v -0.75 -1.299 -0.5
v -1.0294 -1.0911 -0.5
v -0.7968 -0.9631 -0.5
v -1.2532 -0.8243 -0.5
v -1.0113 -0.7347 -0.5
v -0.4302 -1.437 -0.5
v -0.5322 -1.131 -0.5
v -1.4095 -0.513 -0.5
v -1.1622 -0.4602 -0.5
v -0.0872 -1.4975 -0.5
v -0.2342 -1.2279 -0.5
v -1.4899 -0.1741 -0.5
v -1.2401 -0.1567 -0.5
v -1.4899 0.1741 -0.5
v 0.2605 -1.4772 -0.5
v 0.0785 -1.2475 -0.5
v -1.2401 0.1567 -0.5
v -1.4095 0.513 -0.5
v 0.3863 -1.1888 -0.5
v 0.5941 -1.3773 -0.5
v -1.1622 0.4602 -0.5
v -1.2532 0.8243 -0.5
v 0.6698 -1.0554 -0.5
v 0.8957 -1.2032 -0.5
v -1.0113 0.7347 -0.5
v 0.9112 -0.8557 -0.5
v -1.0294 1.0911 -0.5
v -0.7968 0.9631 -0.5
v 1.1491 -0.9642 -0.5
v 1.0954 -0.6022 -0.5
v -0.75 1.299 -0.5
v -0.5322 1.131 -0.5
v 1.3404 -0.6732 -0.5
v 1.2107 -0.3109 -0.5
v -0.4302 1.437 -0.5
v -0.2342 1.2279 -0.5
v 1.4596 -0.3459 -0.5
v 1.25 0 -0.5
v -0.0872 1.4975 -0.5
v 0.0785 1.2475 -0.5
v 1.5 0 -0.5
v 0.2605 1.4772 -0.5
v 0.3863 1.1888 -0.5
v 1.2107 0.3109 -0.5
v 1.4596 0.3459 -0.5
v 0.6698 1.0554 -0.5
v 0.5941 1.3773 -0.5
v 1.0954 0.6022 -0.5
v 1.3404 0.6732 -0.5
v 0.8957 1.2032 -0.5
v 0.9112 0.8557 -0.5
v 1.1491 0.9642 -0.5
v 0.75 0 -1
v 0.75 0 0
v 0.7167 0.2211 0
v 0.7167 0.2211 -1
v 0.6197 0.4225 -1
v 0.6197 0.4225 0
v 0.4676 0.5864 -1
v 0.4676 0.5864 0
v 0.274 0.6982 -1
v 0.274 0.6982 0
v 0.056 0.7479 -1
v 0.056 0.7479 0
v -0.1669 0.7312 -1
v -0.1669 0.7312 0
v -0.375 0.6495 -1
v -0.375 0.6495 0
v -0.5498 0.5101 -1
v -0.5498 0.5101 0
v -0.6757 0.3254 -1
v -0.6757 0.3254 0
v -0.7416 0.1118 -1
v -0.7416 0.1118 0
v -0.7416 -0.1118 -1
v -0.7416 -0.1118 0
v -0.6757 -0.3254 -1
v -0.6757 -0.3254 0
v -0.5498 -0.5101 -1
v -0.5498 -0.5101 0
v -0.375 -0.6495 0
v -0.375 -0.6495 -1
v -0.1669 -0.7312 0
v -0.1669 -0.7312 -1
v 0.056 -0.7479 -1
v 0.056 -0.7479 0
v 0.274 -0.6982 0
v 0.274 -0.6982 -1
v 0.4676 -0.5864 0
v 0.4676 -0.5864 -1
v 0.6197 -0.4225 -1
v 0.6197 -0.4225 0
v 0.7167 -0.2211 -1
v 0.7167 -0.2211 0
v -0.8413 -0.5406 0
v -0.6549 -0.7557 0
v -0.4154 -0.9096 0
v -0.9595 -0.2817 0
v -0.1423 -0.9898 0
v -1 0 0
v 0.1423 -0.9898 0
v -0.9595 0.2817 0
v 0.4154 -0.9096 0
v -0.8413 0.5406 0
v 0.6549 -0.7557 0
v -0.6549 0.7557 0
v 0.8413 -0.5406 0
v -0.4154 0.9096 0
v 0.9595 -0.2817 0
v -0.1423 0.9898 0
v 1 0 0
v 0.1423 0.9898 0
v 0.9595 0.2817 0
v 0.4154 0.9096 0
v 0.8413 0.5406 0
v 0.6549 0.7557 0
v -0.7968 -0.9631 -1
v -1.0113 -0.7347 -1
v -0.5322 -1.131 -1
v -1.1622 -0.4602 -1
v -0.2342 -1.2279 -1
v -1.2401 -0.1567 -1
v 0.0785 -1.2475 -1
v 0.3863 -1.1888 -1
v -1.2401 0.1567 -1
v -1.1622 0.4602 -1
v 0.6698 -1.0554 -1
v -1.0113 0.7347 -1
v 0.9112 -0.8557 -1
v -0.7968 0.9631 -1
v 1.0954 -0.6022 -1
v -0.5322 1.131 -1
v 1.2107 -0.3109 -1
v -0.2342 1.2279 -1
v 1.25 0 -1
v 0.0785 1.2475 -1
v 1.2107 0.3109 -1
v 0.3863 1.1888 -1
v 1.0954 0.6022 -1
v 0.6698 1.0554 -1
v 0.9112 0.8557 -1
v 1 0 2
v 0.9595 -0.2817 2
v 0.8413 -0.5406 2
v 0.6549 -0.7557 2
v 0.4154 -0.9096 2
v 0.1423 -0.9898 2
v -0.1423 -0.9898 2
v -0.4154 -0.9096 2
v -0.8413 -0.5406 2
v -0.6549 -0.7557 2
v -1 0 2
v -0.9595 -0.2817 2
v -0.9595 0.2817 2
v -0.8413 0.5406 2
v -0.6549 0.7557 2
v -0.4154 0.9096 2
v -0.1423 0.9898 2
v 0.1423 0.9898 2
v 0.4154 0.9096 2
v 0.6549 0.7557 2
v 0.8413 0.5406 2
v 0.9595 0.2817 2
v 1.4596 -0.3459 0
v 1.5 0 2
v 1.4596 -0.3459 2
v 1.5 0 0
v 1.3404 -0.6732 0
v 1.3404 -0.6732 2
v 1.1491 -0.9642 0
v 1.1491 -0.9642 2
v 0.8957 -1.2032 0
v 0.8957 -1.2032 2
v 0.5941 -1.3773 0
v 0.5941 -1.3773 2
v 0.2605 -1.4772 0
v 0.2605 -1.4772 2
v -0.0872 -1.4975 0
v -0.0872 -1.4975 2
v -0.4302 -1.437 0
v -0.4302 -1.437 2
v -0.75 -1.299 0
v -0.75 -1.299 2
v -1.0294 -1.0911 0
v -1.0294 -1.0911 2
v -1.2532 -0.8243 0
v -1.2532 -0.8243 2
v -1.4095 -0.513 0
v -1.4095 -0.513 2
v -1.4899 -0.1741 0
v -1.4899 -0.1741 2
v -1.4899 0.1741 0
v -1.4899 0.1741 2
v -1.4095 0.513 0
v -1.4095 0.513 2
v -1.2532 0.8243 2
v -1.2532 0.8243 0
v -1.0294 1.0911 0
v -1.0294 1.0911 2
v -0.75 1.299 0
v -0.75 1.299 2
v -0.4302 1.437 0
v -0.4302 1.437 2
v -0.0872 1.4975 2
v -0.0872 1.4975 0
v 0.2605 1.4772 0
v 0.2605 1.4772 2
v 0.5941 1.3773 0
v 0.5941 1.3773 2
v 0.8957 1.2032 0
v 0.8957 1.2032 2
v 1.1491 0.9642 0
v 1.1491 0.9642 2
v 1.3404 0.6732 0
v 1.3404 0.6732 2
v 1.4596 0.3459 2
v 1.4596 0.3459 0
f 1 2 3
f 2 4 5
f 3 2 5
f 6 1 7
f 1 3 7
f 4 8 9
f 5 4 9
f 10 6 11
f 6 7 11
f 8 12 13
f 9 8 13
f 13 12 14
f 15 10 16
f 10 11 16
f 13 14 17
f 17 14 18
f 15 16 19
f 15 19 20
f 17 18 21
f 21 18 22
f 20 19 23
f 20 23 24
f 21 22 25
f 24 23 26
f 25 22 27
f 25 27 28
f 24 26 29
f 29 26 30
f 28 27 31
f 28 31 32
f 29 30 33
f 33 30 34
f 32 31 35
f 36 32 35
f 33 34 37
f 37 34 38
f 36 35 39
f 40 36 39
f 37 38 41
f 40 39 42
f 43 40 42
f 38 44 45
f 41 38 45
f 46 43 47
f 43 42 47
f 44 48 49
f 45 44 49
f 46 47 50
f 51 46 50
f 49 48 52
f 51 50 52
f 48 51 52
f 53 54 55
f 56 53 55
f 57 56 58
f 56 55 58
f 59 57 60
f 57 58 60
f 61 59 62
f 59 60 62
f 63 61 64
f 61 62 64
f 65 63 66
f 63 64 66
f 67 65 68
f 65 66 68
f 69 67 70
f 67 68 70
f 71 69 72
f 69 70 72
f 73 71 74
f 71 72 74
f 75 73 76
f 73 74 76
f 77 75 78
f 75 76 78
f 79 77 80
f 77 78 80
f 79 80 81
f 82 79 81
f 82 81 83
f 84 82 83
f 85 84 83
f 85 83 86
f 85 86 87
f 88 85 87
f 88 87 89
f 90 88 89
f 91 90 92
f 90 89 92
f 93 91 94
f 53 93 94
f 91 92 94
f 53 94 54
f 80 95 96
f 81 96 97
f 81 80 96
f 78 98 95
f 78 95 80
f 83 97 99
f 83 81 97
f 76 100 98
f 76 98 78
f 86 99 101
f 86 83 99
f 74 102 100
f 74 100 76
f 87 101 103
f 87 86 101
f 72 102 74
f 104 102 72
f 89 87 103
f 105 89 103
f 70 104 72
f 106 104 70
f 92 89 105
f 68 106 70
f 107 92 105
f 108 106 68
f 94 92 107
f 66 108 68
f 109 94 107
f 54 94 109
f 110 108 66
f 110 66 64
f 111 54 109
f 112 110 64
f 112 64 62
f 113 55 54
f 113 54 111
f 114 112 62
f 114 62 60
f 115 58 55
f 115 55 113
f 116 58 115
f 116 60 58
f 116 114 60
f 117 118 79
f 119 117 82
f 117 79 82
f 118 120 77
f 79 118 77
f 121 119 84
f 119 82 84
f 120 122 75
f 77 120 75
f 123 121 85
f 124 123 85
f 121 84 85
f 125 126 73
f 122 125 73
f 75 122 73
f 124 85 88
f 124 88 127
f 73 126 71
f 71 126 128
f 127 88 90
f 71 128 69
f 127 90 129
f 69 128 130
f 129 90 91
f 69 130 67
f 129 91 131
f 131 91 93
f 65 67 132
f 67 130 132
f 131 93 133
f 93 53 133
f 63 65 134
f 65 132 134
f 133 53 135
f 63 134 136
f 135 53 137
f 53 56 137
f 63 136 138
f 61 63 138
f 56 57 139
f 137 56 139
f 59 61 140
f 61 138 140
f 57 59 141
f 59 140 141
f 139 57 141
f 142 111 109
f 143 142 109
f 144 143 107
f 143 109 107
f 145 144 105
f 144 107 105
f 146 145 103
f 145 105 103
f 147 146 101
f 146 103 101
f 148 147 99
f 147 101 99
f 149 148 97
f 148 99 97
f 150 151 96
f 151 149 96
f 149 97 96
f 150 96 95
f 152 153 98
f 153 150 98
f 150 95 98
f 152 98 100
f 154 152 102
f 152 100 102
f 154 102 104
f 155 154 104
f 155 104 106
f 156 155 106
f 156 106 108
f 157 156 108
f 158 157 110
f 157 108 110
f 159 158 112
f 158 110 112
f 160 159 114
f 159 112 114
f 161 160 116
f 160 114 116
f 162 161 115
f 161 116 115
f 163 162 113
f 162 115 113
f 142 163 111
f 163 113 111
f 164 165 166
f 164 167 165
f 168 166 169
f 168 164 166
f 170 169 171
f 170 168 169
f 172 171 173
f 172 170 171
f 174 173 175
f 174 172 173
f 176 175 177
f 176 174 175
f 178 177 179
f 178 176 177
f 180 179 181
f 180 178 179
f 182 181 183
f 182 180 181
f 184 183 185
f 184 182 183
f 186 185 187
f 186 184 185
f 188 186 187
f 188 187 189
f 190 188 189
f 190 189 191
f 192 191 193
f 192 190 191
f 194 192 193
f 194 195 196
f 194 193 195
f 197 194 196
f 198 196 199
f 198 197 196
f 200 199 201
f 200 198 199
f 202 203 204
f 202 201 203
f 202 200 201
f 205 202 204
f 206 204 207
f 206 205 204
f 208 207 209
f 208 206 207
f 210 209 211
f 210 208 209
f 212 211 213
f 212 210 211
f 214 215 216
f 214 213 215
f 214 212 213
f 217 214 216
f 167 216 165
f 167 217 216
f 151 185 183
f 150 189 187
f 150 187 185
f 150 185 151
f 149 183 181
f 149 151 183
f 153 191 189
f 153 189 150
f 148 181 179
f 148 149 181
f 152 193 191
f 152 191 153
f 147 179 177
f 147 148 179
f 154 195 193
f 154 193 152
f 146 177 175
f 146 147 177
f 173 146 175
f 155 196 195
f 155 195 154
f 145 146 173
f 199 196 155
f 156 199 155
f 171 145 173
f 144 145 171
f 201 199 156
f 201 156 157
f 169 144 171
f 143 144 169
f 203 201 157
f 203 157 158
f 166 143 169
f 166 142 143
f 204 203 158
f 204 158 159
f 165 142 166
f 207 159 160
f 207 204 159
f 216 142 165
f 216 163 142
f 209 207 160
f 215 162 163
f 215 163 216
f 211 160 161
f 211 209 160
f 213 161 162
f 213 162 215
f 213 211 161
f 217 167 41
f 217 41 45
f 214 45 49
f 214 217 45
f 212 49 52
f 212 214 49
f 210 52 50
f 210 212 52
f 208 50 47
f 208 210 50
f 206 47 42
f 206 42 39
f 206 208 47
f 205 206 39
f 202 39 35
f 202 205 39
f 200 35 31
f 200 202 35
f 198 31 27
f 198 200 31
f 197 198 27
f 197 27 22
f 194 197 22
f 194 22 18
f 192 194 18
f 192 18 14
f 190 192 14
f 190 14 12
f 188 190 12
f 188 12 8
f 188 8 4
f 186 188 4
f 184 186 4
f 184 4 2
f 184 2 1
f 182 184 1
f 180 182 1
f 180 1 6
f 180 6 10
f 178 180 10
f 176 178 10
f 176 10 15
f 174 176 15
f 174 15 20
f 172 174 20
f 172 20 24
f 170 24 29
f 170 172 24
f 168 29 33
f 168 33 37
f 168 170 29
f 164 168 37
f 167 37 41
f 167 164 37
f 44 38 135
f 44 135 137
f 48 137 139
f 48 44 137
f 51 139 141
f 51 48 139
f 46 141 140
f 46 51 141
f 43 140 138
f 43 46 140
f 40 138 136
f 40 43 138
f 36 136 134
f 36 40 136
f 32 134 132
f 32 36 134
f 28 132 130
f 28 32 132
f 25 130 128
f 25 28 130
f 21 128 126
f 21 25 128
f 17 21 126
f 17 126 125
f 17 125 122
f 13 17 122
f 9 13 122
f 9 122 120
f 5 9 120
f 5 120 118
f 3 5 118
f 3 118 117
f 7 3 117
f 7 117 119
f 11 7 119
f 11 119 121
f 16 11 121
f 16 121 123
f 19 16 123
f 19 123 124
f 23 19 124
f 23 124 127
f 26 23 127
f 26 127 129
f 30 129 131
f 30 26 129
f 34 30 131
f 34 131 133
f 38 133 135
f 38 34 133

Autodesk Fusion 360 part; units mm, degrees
sketch "スケッチ1" plane through (0, 0, 0) normal (0, 0, 1) x (1, 0, 0)
  circle A0 centre (0, 0) radius 0.75
  circle A1 centre (0, 0) radius 1
  circle A2 centre (0, 0) radius 1.5
  circle A3 centre (0, 0) radius 1.25
  dimension "d1" = 1.5
  dimension "d2" = 2
  dimension "d3" = 3
  dimension "d9" = 2.5
extrude "押し出し1" add sketch "スケッチ1" against normal blind 1 contours A1 | A3
extrude "押し出し2" add sketch "スケッチ1" along normal blind 2 contours A2 | A3
extrude "押し出し3" add sketch "スケッチ1" against normal blind 0.5 contours A1 | A2 | A3
